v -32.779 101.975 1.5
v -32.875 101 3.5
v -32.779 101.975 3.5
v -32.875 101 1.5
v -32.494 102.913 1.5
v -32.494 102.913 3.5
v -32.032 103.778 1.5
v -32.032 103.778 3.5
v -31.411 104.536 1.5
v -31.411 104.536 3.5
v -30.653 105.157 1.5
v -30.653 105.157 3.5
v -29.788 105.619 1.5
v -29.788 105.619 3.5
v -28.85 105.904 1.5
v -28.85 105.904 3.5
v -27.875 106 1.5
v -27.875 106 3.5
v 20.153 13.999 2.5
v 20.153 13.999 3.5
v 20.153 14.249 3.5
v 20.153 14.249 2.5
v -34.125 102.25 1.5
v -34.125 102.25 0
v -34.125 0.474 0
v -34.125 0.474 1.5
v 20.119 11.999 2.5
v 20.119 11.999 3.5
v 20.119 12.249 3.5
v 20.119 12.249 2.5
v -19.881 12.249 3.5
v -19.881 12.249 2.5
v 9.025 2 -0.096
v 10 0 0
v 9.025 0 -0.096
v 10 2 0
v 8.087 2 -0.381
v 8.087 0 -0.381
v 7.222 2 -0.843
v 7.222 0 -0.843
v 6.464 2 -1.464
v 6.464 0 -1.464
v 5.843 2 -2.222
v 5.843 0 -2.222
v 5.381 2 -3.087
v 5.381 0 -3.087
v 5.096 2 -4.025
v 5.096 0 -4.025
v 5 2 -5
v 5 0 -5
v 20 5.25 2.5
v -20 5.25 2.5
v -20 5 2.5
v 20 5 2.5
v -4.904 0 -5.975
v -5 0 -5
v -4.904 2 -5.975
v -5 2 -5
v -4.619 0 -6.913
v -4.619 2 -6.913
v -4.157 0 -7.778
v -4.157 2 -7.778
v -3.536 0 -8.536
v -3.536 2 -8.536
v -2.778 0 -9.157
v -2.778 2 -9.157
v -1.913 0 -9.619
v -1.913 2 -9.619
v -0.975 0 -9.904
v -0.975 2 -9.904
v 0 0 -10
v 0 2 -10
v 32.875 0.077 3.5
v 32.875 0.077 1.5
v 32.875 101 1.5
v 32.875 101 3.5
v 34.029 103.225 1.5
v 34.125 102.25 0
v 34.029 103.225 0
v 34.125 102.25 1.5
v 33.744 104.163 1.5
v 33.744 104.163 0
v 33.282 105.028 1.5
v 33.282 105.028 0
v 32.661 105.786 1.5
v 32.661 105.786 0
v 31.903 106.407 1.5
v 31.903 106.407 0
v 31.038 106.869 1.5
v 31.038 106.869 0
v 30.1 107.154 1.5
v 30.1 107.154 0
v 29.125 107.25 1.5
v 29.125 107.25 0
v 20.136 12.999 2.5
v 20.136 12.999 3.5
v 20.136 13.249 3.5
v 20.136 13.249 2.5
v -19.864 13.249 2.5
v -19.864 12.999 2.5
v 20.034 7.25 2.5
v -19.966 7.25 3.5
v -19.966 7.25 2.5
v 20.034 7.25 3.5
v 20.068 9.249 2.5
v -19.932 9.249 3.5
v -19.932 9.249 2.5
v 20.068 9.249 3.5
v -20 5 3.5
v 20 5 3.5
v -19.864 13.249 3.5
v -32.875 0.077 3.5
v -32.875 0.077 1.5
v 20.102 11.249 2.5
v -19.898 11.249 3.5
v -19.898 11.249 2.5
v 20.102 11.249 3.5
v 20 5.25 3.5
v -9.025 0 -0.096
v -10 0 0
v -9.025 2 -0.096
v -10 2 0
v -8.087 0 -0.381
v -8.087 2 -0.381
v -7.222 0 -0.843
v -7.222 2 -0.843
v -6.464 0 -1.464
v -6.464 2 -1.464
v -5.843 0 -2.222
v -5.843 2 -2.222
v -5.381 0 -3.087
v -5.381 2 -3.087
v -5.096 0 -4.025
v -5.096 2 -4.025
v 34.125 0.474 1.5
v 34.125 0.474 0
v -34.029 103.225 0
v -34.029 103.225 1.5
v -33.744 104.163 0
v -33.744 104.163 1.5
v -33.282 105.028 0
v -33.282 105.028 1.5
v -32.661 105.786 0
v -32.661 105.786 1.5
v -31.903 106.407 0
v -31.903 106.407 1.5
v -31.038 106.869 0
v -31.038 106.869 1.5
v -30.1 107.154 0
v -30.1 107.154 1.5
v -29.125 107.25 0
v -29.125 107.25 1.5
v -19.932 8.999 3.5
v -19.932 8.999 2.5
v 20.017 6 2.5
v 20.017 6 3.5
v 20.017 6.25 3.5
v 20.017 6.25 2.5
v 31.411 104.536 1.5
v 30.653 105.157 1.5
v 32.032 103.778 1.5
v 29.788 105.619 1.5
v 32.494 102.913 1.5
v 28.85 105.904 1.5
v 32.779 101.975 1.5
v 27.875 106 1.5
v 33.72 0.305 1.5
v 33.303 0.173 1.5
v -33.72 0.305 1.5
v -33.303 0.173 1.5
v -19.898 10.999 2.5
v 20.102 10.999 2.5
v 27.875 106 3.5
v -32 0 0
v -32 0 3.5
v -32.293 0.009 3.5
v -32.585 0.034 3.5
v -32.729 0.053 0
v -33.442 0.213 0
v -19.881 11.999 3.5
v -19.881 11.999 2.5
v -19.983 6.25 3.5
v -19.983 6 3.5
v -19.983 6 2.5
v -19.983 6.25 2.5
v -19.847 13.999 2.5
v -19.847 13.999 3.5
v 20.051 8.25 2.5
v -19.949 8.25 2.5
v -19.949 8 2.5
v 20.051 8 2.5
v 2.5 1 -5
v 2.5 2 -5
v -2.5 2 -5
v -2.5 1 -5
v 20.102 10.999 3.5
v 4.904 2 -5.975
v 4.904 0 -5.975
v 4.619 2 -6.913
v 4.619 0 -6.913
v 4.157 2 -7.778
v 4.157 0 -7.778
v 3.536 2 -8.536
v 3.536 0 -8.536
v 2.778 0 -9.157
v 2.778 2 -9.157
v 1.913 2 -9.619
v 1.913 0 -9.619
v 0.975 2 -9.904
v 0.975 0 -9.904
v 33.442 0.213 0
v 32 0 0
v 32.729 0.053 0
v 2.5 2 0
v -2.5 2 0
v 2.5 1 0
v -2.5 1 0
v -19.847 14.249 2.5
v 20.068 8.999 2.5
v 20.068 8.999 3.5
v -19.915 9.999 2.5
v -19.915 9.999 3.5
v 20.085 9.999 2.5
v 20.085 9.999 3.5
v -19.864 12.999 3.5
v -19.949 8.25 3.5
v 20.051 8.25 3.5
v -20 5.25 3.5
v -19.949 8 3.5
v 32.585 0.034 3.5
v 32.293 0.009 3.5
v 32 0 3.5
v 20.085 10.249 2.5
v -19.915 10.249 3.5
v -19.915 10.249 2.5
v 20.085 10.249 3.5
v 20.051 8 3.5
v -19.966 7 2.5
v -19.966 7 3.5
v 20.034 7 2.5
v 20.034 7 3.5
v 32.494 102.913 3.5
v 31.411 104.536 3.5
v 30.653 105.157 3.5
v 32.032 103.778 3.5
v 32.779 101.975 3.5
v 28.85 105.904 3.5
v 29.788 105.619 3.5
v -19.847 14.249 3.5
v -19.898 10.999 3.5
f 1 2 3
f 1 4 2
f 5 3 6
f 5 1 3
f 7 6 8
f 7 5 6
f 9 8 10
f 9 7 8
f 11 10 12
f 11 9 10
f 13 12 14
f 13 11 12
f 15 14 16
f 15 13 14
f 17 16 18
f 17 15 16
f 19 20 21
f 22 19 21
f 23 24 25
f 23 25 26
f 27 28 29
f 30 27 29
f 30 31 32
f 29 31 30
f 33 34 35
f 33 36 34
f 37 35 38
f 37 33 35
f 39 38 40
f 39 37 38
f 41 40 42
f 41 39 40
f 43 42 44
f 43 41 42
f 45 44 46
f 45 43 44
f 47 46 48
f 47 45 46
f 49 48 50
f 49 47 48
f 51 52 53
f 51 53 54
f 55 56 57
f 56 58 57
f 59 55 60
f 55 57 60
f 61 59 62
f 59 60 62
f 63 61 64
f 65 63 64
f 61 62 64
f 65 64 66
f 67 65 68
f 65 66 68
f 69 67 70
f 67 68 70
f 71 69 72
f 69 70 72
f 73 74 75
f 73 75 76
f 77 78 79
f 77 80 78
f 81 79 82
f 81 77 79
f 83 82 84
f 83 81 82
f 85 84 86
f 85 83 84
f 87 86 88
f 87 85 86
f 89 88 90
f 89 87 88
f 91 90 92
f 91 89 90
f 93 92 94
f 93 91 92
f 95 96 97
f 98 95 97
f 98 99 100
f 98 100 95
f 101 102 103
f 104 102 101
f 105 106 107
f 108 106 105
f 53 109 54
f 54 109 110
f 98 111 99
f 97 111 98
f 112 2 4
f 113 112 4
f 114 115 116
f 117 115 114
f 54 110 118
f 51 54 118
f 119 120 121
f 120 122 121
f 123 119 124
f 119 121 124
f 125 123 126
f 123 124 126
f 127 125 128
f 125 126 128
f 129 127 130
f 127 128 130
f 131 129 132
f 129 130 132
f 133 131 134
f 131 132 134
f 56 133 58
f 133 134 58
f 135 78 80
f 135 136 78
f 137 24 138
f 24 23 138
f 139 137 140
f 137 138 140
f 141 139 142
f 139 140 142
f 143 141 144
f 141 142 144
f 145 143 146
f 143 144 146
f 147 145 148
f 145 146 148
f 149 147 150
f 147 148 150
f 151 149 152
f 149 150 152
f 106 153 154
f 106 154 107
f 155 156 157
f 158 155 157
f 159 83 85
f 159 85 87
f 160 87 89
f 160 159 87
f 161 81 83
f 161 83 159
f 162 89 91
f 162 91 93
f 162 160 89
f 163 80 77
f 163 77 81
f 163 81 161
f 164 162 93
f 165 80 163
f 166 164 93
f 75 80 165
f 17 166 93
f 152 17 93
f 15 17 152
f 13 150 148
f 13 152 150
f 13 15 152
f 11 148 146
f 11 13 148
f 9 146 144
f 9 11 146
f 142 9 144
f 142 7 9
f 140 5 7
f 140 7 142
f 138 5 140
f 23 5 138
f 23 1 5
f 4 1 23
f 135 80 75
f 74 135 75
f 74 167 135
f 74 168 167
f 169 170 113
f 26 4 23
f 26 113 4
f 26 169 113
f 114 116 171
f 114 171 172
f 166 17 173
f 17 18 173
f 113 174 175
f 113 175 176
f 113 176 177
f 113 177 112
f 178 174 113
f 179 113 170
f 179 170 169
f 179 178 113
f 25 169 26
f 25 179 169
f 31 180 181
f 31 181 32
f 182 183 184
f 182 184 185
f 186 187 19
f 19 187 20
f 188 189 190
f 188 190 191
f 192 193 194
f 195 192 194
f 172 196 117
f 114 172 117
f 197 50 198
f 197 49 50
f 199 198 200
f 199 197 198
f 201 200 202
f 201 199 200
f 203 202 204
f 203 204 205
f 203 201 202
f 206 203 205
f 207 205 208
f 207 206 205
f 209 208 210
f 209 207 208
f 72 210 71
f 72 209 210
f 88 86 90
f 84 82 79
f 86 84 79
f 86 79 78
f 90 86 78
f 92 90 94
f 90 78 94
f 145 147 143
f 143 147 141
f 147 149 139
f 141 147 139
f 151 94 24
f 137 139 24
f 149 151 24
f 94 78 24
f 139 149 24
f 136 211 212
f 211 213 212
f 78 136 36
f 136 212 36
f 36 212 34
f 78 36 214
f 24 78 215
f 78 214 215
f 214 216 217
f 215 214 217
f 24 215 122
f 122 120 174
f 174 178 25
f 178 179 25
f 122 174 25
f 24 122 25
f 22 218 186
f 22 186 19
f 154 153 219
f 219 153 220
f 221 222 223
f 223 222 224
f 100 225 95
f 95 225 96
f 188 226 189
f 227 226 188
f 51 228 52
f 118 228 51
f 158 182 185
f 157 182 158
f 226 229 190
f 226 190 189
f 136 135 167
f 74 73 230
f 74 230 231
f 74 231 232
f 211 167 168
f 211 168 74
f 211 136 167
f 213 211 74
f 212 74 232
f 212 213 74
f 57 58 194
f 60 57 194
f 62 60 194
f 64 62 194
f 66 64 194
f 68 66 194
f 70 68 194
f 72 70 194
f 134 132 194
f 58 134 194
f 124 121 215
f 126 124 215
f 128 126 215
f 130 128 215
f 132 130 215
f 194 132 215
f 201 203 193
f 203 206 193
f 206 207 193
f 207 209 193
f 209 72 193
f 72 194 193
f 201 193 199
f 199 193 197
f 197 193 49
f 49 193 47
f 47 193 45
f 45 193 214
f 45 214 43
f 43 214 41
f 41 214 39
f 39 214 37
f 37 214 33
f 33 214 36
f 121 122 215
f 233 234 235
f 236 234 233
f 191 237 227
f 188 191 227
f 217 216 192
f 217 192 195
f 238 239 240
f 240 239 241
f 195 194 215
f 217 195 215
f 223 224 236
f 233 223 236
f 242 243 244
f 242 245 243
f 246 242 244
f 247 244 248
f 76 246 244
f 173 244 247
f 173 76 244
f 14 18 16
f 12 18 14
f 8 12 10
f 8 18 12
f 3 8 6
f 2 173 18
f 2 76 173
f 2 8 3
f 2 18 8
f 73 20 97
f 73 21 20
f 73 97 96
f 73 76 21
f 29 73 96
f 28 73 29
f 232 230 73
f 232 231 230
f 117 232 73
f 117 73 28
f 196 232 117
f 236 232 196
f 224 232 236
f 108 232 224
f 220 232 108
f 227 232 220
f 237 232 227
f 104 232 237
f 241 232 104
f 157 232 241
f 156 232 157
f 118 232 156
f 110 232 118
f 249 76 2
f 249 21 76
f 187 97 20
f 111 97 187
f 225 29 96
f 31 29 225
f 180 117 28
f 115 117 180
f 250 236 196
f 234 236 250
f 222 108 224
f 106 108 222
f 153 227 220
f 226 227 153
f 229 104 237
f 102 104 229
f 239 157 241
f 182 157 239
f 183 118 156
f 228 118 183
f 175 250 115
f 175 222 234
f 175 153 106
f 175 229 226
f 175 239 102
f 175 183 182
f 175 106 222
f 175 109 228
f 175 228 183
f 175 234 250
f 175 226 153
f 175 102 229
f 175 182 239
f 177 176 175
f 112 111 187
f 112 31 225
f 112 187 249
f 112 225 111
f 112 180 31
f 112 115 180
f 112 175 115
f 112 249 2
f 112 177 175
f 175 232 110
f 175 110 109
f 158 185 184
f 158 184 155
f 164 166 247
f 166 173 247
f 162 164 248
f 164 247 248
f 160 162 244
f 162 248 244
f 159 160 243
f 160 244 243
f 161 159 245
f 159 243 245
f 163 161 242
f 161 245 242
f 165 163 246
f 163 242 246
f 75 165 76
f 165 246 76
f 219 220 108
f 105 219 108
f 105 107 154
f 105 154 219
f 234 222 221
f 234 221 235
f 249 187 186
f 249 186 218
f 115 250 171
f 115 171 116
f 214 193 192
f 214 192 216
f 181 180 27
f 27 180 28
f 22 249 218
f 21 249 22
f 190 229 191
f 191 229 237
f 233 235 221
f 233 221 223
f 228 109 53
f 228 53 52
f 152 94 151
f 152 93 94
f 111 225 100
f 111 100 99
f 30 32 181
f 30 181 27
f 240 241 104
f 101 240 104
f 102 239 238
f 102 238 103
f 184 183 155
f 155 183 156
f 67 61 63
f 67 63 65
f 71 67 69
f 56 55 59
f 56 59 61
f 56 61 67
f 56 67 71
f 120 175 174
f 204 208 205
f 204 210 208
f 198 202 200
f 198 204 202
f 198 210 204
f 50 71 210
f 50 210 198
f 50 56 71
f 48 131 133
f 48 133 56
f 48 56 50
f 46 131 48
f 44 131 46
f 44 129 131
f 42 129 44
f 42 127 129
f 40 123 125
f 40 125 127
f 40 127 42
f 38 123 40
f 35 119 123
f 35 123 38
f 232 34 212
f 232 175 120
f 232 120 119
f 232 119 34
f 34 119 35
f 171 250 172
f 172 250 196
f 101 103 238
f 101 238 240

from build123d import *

# Parameters (mm, degrees)
F1_DEPTH  = 106
F2_W      = 68.25
F2_H      = 1.5
F3_DEPTH  = 1.25
F4_R      = 5
F6_DEPTH  = 25
F7_W      = 10
F7_H      = 10
F8_DEPTH  = 2
F9_R      = 4.99999
F10_W     = 5
F10_H     = 5
F11_DEPTH = 1
F12_W     = 40
F12_H     = 0.25
F13_DEPTH = 1


# Not quite as in the source:
# - a fillet or chamfer is up to 0.001 mm smaller than in the source, because OpenCascade refuses the exact size


with BuildPart() as f1:
    # F0 (on Front) → F1 (new body)
    with BuildSketch(Plane.XZ):
        Polygon((32.875, 1.5), (32.875, 3.5), (-32.875, 3.5), (-32.875, 1.5), (-34.125, 1.5), (-34.125, 0), (34.125, 0), (34.125, 1.5), align=None)
    extrude(amount=-F1_DEPTH)

    # F2 (on face) → F3 (join)
    with BuildSketch(Plane(origin=(0, 106, 0), x_dir=(-1, 0, 0), z_dir=(0, 1, 0))):
        with Locations((0, 0.75)):
            Rectangle(F2_W, F2_H)
    extrude(amount=F3_DEPTH)

    # F4
    f4_edges = [f1.edges().sort_by_distance(p)[0] for p in [
        (34.125, 107.25, 0.75),
        (-34.125, 107.25, 0.75),
        (-32.875, 106, 2.5),
        (32.875, 106, 2.5),
    ]]
    fillet(f4_edges, radius=F4_R)

    # F5 (on Top) → F6 (cut)
    with BuildSketch(Plane.XY):
        with BuildLine():
            ThreePointArc((-32, 0), (-35.5355339059, 1.4644660941), (-37, 5))
            Line((-37, 5), (-47.4459486902, 5.1317643374))
            Line((-47.4459486902, 5.1317643374), (-32.4784885049, -8.2395952195))
            Line((-32.4784885049, -8.2395952195), (-32, 0))
        make_face()
        with BuildLine():
            Line((47.8749121428, 4.8458835855), (37, 4.9999998882))
            ThreePointArc((37, 4.9999998882), (35.5355339059, 1.4644659823), (32, -1.118e-07))
            Line((32, -1.118e-07), (31.699370116, -9.054190591))
            Line((31.699370116, -9.054190591), (47.8749121428, 4.8458835855))
        make_face()
    extrude(amount=F6_DEPTH, mode=Mode.SUBTRACT)

    # F7 (on face) → F8 (join)
    with BuildSketch(Plane.XZ):
        with Locations((0, -5)):
            Rectangle(F7_W, F7_H)
    extrude(amount=-F8_DEPTH)

    # F9 (radius 5 in the source; OpenCascade refuses exactly that, so slightly less here)
    f9_edges = [f1.edges().sort_by_distance(p)[0] for p in [
        (5, 1, 0),
        (-5, 1, 0),
        (-5, 1, -10),
        (5, 1, -10),
    ]]
    fillet(f9_edges, radius=F9_R)

    # F10 (on face) → F11 (cut)
    with BuildSketch(Plane(origin=(0, 2, 0), x_dir=(-1, 0, 0), z_dir=(0, 1, 0))):
        with Locations((0, -2.5)):
            Rectangle(F10_W, F10_H)
    extrude(amount=-F11_DEPTH, mode=Mode.SUBTRACT)

    # F12 (on face) → F13 (cut)
    with BuildSketch(Plane.XY.offset(3.5)):
        with Locations((0, 5.125)):
            Rectangle(F12_W, F12_H)
        with Locations((0.0169467185, 6.1248563941)):
            Rectangle(F12_W, F12_H)
        with Locations((0.0338934371, 7.1247127881)):
            Rectangle(F12_W, F12_H)
        with Locations((0.0508401556, 8.1245691822)):
            Rectangle(F12_W, F12_H)
        with Locations((0.0677868742, 9.1244255762)):
            Rectangle(F12_W, F12_H)
        with Locations((0.0847335927, 10.1242819703)):
            Rectangle(F12_W, F12_H)
        with Locations((0.1016803113, 11.1241383643)):
            Rectangle(F12_W, F12_H)
        with Locations((0.1186270298, 12.1239947584)):
            Rectangle(F12_W, F12_H)
        with Locations((0.1355737483, 13.1238511524)):
            Rectangle(F12_W, F12_H)
        with Locations((0.1525204669, 14.1237075465)):
            Rectangle(F12_W, F12_H)
    extrude(amount=-F13_DEPTH, mode=Mode.SUBTRACT)


solid = f1.part
